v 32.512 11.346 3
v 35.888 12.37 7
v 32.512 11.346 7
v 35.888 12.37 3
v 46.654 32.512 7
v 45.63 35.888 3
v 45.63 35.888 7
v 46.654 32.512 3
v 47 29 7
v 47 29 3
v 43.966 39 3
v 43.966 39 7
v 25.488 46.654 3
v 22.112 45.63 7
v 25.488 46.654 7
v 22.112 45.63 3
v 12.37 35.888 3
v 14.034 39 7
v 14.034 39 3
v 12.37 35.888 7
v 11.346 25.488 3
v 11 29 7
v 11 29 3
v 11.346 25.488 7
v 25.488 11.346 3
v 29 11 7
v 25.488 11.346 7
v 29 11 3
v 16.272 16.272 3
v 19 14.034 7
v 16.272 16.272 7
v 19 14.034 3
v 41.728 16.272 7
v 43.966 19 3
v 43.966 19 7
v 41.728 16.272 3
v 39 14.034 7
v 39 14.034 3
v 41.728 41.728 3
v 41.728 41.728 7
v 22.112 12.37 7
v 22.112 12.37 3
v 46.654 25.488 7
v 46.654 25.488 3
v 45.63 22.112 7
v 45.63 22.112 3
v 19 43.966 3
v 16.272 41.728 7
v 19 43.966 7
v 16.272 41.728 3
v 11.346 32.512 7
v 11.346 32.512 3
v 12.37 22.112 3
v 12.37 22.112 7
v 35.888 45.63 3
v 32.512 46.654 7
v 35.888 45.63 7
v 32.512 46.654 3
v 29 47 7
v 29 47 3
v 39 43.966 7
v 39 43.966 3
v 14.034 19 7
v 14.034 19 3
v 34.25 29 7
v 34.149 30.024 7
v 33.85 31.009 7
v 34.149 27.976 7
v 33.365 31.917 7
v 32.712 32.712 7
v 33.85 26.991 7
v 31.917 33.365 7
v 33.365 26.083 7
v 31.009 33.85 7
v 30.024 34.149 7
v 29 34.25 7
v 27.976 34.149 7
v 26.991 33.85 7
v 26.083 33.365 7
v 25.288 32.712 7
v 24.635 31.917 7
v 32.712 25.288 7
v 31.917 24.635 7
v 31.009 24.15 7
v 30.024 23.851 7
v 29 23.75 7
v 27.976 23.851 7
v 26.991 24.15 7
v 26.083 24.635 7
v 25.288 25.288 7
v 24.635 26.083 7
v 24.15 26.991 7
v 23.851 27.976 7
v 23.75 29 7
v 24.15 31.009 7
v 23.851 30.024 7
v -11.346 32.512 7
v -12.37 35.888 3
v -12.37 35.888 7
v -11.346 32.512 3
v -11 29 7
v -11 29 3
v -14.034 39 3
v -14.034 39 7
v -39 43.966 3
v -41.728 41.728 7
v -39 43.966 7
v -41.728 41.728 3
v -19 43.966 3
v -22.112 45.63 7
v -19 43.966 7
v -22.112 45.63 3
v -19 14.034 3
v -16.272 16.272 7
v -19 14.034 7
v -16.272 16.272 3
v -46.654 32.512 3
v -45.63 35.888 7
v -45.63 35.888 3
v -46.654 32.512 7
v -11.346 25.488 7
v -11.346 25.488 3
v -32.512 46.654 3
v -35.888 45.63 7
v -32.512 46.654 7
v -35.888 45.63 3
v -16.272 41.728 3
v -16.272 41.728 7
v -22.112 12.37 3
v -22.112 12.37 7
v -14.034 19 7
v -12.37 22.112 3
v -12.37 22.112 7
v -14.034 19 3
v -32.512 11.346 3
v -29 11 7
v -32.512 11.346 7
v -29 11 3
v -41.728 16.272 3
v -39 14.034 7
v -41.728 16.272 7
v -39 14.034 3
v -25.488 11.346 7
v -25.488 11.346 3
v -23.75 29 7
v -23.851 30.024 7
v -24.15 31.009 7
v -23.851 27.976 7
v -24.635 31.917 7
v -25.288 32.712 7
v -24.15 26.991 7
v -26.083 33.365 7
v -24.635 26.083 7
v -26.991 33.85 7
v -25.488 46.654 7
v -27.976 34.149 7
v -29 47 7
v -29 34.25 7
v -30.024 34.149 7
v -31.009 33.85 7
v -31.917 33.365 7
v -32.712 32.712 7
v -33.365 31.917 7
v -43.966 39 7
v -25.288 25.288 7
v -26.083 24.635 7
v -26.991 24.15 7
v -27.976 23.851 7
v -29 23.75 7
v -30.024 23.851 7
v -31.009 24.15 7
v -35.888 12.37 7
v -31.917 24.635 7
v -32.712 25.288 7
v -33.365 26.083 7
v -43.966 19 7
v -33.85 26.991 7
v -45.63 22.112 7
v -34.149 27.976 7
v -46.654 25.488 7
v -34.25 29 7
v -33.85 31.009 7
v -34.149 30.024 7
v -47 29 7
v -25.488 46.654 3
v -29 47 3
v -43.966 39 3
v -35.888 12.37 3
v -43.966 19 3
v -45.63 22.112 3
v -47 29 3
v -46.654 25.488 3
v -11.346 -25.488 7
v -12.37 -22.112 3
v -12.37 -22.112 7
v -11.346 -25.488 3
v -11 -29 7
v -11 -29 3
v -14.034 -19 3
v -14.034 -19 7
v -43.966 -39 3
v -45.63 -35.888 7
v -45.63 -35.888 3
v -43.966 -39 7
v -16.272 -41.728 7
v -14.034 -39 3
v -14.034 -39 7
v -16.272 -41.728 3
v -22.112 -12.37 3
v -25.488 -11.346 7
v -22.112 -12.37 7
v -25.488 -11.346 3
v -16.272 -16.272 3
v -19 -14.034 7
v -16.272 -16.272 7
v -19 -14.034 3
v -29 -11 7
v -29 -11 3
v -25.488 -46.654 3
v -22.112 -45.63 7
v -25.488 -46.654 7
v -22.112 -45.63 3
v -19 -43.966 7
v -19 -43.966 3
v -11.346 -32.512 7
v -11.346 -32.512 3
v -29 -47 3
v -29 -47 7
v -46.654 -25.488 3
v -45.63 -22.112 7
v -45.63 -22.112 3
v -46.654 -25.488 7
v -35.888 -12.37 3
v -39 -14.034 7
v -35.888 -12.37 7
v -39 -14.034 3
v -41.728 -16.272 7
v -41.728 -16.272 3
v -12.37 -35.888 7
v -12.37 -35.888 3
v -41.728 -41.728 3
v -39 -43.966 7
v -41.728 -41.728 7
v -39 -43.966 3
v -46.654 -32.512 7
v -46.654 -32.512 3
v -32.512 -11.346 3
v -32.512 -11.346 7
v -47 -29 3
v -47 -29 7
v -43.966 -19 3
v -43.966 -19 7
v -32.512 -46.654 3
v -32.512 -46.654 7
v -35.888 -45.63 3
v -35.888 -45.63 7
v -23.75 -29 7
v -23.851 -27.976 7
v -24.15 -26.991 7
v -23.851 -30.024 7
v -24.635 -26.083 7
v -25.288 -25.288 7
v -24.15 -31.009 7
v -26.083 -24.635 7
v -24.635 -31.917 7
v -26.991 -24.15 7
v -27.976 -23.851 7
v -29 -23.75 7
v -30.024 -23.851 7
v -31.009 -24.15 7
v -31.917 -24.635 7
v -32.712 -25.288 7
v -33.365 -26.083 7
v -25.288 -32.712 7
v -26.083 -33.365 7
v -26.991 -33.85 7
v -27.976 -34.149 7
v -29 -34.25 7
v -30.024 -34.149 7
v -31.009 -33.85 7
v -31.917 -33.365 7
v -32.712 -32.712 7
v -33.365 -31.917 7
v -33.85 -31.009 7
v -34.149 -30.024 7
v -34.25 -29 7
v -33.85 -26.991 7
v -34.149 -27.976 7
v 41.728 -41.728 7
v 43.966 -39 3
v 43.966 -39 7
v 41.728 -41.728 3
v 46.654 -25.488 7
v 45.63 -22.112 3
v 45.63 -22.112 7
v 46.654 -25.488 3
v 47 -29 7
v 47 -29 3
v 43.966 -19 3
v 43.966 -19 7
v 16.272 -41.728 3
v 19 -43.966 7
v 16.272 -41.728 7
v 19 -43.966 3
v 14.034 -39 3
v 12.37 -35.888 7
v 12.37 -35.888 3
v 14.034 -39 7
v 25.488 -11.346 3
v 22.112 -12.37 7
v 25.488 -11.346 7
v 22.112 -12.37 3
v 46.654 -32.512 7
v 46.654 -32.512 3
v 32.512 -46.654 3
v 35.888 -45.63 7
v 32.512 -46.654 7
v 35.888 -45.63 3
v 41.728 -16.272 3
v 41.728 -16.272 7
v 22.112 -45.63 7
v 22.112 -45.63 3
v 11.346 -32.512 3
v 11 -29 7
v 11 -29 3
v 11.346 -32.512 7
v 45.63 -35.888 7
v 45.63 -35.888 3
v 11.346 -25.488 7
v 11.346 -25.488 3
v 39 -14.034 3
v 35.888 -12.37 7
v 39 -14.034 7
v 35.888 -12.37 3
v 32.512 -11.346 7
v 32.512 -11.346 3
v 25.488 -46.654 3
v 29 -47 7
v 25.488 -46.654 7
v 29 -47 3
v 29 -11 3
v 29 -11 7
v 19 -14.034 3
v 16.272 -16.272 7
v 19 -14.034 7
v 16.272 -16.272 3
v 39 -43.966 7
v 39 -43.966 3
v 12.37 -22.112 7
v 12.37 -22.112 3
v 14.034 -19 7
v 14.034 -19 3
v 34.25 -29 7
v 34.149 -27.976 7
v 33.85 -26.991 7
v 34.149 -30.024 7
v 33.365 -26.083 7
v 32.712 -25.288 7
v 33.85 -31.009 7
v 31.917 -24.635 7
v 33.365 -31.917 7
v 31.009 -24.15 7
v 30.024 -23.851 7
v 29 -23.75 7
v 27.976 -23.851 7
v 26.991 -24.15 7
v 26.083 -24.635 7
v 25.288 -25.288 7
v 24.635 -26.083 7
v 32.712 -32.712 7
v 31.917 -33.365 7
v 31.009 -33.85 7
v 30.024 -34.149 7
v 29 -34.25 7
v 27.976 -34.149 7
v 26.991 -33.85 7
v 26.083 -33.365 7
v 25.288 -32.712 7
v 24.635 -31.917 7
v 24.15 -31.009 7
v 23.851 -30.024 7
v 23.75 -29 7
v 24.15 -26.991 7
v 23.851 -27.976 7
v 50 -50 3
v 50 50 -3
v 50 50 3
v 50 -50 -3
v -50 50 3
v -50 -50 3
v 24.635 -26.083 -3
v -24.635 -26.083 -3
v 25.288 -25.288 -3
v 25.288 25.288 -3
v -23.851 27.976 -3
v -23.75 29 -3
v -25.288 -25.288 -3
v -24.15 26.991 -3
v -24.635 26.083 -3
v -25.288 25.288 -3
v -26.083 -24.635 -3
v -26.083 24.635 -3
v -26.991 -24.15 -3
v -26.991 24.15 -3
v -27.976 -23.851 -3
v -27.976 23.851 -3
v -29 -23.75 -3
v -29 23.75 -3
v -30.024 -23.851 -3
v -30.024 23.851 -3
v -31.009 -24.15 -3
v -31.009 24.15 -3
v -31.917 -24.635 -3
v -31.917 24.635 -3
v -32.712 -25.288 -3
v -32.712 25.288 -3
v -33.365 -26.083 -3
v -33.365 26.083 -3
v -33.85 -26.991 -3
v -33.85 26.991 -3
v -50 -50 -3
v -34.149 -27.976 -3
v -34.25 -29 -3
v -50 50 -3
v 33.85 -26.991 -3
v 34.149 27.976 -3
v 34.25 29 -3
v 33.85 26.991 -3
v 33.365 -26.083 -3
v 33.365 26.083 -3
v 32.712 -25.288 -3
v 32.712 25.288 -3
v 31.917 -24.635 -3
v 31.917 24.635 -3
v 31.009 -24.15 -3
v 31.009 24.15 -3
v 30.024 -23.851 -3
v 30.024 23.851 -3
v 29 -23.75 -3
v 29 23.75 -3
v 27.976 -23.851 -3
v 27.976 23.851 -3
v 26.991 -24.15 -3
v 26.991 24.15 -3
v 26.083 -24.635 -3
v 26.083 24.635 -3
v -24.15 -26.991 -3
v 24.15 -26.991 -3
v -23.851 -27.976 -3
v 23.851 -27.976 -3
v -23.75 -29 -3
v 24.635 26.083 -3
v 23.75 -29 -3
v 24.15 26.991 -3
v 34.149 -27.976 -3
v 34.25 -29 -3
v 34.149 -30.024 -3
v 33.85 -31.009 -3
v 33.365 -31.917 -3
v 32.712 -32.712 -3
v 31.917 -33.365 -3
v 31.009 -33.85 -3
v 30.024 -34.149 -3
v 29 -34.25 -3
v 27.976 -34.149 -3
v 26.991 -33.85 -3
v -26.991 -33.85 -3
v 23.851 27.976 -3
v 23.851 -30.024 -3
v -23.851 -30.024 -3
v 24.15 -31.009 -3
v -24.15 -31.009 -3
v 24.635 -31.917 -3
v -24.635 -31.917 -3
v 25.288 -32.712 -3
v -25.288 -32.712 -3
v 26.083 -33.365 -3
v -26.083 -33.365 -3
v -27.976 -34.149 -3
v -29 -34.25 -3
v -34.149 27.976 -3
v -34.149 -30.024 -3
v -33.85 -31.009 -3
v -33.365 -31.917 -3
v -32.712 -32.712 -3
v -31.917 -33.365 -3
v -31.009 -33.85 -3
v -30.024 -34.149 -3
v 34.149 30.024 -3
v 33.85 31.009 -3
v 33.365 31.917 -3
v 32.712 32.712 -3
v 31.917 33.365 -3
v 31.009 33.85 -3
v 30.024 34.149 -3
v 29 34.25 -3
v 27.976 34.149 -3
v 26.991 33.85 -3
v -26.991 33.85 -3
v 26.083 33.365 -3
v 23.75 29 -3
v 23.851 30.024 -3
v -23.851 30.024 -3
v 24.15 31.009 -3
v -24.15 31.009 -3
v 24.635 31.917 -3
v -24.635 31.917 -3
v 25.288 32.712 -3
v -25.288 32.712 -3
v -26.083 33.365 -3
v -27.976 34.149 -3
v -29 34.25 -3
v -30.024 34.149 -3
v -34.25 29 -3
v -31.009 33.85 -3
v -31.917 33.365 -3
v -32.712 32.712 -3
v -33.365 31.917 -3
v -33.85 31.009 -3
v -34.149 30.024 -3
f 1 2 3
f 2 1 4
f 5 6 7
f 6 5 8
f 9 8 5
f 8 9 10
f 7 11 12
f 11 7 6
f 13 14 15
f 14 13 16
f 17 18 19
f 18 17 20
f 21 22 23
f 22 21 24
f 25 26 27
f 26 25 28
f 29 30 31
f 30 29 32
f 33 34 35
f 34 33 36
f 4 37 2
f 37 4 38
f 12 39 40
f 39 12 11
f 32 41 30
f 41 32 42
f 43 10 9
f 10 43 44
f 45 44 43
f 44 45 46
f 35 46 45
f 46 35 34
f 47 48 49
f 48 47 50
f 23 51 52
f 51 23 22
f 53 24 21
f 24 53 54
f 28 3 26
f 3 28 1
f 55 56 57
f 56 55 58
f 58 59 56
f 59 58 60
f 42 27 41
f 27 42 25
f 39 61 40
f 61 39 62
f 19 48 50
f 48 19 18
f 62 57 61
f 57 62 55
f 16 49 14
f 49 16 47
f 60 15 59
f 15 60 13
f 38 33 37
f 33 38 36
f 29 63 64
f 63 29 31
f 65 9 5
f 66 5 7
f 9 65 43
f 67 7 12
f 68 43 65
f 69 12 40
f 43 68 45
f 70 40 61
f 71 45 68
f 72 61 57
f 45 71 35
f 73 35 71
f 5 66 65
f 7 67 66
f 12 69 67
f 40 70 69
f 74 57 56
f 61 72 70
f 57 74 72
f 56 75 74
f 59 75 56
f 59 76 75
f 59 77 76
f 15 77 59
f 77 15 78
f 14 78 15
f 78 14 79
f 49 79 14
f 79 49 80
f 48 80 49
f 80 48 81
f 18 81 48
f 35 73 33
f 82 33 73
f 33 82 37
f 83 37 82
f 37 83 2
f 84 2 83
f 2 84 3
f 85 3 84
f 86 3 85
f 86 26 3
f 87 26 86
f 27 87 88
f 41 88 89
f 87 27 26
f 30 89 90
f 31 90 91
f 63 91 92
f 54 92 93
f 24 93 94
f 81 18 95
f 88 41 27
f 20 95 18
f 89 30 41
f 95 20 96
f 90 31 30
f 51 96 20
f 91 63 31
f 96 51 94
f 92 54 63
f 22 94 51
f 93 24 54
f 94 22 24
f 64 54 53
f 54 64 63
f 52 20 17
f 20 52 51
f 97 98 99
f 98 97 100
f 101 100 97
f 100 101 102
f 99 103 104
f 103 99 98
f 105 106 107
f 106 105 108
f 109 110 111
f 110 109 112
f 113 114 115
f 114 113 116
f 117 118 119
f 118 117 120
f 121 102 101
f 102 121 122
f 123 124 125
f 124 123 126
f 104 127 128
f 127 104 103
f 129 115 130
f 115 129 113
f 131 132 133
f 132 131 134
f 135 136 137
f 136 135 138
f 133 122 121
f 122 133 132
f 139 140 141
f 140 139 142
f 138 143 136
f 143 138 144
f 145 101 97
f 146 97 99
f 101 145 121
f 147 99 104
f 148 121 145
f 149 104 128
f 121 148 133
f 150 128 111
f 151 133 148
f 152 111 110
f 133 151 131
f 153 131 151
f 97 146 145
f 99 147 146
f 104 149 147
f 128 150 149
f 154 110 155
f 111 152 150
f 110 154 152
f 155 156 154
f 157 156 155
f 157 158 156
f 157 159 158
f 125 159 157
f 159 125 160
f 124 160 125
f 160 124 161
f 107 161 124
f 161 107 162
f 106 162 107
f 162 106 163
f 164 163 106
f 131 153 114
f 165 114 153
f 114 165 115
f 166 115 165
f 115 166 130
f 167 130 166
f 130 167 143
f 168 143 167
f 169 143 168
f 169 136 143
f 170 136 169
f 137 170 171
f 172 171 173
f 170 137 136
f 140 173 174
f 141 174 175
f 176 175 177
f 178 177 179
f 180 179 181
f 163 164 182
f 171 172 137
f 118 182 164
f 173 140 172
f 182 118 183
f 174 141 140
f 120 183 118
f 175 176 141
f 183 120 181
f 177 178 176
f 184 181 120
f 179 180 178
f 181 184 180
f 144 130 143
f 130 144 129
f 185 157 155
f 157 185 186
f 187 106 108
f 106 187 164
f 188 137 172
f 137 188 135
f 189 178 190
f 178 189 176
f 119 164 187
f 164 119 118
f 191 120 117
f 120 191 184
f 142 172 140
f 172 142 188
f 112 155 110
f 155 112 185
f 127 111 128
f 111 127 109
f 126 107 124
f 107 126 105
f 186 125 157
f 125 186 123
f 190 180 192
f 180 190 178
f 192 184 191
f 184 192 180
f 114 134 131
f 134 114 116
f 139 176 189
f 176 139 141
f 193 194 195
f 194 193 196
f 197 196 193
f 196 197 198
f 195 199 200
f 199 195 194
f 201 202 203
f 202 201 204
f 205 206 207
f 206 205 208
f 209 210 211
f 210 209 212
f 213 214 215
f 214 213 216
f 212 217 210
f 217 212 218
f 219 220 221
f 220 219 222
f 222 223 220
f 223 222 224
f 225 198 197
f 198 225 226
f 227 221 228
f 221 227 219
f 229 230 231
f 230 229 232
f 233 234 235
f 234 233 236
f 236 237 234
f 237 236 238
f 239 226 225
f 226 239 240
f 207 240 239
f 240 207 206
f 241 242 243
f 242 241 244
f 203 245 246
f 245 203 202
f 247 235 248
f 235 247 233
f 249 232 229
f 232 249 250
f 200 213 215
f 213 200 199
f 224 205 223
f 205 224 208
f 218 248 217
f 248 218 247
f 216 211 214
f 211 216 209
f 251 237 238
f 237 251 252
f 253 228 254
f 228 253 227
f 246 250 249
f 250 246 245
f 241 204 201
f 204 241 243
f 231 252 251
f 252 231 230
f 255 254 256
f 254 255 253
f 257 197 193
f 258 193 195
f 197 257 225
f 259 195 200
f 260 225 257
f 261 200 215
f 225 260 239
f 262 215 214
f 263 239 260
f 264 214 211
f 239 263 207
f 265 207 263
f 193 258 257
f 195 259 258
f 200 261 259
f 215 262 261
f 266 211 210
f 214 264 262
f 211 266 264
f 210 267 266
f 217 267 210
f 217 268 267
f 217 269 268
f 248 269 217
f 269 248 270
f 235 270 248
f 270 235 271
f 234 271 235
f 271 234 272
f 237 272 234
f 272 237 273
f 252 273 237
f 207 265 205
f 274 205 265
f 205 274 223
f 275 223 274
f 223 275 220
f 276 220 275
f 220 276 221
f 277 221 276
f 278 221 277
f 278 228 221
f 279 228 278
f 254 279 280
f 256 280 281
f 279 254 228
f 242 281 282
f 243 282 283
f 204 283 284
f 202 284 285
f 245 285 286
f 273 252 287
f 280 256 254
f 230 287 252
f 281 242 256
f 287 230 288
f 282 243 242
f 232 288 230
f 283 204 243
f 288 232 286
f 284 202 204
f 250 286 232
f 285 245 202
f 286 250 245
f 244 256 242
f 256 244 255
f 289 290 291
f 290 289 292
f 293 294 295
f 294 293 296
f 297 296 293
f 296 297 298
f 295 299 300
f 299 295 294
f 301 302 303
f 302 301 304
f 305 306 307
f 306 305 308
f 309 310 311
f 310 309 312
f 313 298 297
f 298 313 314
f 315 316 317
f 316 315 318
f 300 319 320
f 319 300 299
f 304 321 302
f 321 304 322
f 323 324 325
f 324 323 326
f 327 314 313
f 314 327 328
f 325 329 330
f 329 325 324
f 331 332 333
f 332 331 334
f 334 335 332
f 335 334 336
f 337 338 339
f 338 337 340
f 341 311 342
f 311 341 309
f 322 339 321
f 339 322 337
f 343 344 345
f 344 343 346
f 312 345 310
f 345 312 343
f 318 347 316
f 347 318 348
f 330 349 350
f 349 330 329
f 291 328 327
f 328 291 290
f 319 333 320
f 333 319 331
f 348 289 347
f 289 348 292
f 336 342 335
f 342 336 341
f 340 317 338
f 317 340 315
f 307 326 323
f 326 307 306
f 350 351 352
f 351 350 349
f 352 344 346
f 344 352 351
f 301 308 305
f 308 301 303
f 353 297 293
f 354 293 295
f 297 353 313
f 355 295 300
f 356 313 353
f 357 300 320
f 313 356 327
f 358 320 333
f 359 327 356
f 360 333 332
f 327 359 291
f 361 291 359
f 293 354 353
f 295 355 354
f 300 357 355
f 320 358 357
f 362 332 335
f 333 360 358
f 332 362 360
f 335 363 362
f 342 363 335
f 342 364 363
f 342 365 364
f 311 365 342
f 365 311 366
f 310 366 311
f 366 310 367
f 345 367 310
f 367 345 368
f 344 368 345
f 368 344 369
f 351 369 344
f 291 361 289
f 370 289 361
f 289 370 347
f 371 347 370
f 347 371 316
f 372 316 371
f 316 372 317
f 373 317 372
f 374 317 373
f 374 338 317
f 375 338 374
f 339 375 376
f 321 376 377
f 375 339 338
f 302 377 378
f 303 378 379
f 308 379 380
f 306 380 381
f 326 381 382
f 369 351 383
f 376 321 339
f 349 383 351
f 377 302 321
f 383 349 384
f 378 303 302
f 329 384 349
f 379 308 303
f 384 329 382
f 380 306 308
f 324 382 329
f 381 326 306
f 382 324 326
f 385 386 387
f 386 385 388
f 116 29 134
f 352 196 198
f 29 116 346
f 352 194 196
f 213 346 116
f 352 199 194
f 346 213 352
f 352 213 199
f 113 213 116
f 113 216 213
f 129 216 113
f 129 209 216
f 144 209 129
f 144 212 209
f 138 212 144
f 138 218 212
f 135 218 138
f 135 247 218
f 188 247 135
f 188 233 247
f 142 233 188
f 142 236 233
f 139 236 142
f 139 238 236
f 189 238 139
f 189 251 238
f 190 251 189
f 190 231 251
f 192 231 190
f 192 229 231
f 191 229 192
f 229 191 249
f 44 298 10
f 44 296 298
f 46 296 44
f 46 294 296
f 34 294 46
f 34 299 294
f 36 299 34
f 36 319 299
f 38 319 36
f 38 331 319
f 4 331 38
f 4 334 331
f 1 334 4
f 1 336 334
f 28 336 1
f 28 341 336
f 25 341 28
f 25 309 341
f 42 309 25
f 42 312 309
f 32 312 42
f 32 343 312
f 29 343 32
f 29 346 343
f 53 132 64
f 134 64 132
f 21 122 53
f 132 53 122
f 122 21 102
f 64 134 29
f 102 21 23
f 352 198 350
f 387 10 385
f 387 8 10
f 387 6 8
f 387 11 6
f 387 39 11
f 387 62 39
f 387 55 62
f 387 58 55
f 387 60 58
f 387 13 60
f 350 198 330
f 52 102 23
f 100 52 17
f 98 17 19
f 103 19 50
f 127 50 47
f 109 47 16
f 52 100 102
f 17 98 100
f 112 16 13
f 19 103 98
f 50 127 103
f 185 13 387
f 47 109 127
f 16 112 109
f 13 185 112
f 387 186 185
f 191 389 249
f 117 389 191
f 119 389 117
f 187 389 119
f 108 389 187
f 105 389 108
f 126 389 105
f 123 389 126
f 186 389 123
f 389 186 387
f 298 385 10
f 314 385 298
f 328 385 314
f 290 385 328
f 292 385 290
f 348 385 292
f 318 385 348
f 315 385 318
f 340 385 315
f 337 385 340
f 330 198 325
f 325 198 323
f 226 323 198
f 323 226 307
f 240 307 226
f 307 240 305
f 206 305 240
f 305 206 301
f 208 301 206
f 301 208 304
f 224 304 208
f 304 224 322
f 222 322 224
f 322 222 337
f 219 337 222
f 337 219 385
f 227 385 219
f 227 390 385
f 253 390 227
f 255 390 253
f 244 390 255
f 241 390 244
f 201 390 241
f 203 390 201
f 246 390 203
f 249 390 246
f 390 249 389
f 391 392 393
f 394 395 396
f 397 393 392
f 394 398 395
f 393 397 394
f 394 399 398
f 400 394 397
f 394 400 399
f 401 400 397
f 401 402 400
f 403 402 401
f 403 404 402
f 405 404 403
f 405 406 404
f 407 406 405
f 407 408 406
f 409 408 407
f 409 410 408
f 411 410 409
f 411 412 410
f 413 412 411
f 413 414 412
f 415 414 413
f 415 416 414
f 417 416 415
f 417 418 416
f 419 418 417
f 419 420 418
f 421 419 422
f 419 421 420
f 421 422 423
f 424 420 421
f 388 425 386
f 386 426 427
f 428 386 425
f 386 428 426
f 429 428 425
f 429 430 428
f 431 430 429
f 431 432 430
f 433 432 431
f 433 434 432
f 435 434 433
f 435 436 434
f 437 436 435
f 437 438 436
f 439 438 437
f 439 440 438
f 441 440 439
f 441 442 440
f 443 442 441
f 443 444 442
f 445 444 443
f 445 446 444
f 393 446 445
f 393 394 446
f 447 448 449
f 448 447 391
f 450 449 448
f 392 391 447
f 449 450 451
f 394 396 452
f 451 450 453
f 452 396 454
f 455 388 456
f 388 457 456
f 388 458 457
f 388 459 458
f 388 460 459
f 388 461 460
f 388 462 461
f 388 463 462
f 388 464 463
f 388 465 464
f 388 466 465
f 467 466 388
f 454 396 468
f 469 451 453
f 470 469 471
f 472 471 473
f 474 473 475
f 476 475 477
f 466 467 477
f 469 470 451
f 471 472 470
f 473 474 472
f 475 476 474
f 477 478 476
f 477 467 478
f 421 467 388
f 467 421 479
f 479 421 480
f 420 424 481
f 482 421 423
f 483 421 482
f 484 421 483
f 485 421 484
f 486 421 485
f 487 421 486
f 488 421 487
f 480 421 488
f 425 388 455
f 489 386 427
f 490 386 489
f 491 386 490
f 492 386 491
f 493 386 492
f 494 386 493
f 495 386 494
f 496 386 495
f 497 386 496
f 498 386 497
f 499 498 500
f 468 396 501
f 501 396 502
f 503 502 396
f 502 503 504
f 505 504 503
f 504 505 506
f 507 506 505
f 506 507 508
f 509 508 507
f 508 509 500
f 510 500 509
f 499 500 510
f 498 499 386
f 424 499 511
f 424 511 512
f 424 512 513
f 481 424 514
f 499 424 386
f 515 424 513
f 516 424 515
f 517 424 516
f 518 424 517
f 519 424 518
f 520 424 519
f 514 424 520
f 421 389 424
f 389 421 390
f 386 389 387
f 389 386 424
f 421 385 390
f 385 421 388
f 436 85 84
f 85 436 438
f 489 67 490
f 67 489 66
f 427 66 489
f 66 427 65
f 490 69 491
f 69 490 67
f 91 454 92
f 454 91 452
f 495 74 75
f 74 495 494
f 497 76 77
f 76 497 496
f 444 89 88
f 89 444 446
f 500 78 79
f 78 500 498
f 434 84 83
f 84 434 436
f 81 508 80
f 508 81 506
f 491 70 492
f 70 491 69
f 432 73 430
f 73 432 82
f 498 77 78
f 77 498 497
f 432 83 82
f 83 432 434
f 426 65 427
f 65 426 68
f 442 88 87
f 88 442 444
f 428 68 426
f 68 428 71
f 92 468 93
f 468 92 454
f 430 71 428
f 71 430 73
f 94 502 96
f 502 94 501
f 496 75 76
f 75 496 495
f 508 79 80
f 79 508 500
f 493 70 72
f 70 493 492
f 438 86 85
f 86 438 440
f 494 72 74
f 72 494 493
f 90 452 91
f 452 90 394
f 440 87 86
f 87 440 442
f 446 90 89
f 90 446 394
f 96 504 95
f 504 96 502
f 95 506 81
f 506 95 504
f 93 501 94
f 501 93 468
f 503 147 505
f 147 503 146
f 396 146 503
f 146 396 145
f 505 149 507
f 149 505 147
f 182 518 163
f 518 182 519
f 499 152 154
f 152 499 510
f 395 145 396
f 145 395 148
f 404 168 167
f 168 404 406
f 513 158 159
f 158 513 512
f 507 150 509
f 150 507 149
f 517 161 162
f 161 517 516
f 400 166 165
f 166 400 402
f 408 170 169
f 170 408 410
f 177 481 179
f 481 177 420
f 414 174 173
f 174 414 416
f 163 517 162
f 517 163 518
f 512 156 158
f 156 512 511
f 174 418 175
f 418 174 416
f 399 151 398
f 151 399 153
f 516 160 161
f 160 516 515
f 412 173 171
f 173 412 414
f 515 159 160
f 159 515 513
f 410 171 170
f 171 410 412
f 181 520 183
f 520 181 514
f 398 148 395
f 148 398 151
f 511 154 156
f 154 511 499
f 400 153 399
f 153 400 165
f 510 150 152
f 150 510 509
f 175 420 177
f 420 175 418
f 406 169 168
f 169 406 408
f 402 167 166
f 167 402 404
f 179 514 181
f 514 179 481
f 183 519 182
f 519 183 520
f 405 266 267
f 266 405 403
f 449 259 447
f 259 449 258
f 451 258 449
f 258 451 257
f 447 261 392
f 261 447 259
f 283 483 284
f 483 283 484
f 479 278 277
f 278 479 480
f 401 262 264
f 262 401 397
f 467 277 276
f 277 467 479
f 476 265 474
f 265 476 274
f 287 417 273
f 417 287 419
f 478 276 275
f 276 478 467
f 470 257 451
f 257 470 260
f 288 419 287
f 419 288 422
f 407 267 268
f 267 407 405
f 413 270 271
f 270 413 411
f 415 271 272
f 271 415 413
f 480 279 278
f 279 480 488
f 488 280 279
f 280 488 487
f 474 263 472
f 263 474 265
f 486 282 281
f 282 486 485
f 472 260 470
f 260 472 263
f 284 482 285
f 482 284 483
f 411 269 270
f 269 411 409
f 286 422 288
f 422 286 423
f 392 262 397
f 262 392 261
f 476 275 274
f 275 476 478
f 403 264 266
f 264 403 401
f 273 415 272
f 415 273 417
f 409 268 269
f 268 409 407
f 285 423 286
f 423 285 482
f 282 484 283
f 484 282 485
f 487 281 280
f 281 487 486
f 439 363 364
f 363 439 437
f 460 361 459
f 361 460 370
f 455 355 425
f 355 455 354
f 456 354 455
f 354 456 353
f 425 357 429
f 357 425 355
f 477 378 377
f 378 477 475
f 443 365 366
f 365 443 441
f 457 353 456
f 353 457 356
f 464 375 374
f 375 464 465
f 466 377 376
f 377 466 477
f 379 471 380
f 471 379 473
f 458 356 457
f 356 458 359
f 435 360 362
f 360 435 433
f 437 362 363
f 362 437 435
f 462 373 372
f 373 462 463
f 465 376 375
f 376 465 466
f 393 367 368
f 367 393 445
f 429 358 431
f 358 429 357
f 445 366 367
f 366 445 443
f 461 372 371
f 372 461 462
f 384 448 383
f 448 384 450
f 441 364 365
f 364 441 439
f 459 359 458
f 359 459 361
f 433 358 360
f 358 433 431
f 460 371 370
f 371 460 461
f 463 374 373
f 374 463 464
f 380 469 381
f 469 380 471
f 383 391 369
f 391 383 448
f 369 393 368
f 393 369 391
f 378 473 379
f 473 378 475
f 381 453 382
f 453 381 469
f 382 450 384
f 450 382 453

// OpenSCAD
$fn = 32;

// ----------------------------------------------------------------------
// Anchor pads 100 x 100 x 10
// four corner bosses with anchor holes
// ----------------------------------------------------------------------

// --- parameters (mm) ---
plate = [100, 100, 6];  // base plate size (x, y, z)
pads = 4;               // boss count, one per corner
edge = 21;              // boss centre offset from the plate edge
boss_d = 36;            // boss diameter
boss_h = 4;             // boss height above the base plate
hole_d = 10.5;          // hole diameter

// --- derived feature positions (mm) ---
height = plate[2] + boss_h;      // = 10   overall height of the part
corner_x = plate[0] / 2 - edge;  // = 29   boss centre X
corner_y = plate[1] / 2 - edge;  // = 29   boss centre Y
feature_centers = [
  [corner_x, corner_y],
  [-corner_x, corner_y],
  [-corner_x, -corner_y],
  [corner_x, -corner_y]
];   // boss centres, anchor holes are drilled there

// base plate, four bosses standing on it, anchor holes all the way through
difference() {
  union() {
    cube(plate, center = true);
    for (centre = feature_centers)
      translate([centre[0], centre[1], plate[2] / 2 - 1])
        cylinder(d = boss_d, h = boss_h + 1);
  }
  for (centre = feature_centers)
    translate([centre[0], centre[1], -height])
      cylinder(d = hole_d, h = 2 * height + 2);  // through boss and plate
}
